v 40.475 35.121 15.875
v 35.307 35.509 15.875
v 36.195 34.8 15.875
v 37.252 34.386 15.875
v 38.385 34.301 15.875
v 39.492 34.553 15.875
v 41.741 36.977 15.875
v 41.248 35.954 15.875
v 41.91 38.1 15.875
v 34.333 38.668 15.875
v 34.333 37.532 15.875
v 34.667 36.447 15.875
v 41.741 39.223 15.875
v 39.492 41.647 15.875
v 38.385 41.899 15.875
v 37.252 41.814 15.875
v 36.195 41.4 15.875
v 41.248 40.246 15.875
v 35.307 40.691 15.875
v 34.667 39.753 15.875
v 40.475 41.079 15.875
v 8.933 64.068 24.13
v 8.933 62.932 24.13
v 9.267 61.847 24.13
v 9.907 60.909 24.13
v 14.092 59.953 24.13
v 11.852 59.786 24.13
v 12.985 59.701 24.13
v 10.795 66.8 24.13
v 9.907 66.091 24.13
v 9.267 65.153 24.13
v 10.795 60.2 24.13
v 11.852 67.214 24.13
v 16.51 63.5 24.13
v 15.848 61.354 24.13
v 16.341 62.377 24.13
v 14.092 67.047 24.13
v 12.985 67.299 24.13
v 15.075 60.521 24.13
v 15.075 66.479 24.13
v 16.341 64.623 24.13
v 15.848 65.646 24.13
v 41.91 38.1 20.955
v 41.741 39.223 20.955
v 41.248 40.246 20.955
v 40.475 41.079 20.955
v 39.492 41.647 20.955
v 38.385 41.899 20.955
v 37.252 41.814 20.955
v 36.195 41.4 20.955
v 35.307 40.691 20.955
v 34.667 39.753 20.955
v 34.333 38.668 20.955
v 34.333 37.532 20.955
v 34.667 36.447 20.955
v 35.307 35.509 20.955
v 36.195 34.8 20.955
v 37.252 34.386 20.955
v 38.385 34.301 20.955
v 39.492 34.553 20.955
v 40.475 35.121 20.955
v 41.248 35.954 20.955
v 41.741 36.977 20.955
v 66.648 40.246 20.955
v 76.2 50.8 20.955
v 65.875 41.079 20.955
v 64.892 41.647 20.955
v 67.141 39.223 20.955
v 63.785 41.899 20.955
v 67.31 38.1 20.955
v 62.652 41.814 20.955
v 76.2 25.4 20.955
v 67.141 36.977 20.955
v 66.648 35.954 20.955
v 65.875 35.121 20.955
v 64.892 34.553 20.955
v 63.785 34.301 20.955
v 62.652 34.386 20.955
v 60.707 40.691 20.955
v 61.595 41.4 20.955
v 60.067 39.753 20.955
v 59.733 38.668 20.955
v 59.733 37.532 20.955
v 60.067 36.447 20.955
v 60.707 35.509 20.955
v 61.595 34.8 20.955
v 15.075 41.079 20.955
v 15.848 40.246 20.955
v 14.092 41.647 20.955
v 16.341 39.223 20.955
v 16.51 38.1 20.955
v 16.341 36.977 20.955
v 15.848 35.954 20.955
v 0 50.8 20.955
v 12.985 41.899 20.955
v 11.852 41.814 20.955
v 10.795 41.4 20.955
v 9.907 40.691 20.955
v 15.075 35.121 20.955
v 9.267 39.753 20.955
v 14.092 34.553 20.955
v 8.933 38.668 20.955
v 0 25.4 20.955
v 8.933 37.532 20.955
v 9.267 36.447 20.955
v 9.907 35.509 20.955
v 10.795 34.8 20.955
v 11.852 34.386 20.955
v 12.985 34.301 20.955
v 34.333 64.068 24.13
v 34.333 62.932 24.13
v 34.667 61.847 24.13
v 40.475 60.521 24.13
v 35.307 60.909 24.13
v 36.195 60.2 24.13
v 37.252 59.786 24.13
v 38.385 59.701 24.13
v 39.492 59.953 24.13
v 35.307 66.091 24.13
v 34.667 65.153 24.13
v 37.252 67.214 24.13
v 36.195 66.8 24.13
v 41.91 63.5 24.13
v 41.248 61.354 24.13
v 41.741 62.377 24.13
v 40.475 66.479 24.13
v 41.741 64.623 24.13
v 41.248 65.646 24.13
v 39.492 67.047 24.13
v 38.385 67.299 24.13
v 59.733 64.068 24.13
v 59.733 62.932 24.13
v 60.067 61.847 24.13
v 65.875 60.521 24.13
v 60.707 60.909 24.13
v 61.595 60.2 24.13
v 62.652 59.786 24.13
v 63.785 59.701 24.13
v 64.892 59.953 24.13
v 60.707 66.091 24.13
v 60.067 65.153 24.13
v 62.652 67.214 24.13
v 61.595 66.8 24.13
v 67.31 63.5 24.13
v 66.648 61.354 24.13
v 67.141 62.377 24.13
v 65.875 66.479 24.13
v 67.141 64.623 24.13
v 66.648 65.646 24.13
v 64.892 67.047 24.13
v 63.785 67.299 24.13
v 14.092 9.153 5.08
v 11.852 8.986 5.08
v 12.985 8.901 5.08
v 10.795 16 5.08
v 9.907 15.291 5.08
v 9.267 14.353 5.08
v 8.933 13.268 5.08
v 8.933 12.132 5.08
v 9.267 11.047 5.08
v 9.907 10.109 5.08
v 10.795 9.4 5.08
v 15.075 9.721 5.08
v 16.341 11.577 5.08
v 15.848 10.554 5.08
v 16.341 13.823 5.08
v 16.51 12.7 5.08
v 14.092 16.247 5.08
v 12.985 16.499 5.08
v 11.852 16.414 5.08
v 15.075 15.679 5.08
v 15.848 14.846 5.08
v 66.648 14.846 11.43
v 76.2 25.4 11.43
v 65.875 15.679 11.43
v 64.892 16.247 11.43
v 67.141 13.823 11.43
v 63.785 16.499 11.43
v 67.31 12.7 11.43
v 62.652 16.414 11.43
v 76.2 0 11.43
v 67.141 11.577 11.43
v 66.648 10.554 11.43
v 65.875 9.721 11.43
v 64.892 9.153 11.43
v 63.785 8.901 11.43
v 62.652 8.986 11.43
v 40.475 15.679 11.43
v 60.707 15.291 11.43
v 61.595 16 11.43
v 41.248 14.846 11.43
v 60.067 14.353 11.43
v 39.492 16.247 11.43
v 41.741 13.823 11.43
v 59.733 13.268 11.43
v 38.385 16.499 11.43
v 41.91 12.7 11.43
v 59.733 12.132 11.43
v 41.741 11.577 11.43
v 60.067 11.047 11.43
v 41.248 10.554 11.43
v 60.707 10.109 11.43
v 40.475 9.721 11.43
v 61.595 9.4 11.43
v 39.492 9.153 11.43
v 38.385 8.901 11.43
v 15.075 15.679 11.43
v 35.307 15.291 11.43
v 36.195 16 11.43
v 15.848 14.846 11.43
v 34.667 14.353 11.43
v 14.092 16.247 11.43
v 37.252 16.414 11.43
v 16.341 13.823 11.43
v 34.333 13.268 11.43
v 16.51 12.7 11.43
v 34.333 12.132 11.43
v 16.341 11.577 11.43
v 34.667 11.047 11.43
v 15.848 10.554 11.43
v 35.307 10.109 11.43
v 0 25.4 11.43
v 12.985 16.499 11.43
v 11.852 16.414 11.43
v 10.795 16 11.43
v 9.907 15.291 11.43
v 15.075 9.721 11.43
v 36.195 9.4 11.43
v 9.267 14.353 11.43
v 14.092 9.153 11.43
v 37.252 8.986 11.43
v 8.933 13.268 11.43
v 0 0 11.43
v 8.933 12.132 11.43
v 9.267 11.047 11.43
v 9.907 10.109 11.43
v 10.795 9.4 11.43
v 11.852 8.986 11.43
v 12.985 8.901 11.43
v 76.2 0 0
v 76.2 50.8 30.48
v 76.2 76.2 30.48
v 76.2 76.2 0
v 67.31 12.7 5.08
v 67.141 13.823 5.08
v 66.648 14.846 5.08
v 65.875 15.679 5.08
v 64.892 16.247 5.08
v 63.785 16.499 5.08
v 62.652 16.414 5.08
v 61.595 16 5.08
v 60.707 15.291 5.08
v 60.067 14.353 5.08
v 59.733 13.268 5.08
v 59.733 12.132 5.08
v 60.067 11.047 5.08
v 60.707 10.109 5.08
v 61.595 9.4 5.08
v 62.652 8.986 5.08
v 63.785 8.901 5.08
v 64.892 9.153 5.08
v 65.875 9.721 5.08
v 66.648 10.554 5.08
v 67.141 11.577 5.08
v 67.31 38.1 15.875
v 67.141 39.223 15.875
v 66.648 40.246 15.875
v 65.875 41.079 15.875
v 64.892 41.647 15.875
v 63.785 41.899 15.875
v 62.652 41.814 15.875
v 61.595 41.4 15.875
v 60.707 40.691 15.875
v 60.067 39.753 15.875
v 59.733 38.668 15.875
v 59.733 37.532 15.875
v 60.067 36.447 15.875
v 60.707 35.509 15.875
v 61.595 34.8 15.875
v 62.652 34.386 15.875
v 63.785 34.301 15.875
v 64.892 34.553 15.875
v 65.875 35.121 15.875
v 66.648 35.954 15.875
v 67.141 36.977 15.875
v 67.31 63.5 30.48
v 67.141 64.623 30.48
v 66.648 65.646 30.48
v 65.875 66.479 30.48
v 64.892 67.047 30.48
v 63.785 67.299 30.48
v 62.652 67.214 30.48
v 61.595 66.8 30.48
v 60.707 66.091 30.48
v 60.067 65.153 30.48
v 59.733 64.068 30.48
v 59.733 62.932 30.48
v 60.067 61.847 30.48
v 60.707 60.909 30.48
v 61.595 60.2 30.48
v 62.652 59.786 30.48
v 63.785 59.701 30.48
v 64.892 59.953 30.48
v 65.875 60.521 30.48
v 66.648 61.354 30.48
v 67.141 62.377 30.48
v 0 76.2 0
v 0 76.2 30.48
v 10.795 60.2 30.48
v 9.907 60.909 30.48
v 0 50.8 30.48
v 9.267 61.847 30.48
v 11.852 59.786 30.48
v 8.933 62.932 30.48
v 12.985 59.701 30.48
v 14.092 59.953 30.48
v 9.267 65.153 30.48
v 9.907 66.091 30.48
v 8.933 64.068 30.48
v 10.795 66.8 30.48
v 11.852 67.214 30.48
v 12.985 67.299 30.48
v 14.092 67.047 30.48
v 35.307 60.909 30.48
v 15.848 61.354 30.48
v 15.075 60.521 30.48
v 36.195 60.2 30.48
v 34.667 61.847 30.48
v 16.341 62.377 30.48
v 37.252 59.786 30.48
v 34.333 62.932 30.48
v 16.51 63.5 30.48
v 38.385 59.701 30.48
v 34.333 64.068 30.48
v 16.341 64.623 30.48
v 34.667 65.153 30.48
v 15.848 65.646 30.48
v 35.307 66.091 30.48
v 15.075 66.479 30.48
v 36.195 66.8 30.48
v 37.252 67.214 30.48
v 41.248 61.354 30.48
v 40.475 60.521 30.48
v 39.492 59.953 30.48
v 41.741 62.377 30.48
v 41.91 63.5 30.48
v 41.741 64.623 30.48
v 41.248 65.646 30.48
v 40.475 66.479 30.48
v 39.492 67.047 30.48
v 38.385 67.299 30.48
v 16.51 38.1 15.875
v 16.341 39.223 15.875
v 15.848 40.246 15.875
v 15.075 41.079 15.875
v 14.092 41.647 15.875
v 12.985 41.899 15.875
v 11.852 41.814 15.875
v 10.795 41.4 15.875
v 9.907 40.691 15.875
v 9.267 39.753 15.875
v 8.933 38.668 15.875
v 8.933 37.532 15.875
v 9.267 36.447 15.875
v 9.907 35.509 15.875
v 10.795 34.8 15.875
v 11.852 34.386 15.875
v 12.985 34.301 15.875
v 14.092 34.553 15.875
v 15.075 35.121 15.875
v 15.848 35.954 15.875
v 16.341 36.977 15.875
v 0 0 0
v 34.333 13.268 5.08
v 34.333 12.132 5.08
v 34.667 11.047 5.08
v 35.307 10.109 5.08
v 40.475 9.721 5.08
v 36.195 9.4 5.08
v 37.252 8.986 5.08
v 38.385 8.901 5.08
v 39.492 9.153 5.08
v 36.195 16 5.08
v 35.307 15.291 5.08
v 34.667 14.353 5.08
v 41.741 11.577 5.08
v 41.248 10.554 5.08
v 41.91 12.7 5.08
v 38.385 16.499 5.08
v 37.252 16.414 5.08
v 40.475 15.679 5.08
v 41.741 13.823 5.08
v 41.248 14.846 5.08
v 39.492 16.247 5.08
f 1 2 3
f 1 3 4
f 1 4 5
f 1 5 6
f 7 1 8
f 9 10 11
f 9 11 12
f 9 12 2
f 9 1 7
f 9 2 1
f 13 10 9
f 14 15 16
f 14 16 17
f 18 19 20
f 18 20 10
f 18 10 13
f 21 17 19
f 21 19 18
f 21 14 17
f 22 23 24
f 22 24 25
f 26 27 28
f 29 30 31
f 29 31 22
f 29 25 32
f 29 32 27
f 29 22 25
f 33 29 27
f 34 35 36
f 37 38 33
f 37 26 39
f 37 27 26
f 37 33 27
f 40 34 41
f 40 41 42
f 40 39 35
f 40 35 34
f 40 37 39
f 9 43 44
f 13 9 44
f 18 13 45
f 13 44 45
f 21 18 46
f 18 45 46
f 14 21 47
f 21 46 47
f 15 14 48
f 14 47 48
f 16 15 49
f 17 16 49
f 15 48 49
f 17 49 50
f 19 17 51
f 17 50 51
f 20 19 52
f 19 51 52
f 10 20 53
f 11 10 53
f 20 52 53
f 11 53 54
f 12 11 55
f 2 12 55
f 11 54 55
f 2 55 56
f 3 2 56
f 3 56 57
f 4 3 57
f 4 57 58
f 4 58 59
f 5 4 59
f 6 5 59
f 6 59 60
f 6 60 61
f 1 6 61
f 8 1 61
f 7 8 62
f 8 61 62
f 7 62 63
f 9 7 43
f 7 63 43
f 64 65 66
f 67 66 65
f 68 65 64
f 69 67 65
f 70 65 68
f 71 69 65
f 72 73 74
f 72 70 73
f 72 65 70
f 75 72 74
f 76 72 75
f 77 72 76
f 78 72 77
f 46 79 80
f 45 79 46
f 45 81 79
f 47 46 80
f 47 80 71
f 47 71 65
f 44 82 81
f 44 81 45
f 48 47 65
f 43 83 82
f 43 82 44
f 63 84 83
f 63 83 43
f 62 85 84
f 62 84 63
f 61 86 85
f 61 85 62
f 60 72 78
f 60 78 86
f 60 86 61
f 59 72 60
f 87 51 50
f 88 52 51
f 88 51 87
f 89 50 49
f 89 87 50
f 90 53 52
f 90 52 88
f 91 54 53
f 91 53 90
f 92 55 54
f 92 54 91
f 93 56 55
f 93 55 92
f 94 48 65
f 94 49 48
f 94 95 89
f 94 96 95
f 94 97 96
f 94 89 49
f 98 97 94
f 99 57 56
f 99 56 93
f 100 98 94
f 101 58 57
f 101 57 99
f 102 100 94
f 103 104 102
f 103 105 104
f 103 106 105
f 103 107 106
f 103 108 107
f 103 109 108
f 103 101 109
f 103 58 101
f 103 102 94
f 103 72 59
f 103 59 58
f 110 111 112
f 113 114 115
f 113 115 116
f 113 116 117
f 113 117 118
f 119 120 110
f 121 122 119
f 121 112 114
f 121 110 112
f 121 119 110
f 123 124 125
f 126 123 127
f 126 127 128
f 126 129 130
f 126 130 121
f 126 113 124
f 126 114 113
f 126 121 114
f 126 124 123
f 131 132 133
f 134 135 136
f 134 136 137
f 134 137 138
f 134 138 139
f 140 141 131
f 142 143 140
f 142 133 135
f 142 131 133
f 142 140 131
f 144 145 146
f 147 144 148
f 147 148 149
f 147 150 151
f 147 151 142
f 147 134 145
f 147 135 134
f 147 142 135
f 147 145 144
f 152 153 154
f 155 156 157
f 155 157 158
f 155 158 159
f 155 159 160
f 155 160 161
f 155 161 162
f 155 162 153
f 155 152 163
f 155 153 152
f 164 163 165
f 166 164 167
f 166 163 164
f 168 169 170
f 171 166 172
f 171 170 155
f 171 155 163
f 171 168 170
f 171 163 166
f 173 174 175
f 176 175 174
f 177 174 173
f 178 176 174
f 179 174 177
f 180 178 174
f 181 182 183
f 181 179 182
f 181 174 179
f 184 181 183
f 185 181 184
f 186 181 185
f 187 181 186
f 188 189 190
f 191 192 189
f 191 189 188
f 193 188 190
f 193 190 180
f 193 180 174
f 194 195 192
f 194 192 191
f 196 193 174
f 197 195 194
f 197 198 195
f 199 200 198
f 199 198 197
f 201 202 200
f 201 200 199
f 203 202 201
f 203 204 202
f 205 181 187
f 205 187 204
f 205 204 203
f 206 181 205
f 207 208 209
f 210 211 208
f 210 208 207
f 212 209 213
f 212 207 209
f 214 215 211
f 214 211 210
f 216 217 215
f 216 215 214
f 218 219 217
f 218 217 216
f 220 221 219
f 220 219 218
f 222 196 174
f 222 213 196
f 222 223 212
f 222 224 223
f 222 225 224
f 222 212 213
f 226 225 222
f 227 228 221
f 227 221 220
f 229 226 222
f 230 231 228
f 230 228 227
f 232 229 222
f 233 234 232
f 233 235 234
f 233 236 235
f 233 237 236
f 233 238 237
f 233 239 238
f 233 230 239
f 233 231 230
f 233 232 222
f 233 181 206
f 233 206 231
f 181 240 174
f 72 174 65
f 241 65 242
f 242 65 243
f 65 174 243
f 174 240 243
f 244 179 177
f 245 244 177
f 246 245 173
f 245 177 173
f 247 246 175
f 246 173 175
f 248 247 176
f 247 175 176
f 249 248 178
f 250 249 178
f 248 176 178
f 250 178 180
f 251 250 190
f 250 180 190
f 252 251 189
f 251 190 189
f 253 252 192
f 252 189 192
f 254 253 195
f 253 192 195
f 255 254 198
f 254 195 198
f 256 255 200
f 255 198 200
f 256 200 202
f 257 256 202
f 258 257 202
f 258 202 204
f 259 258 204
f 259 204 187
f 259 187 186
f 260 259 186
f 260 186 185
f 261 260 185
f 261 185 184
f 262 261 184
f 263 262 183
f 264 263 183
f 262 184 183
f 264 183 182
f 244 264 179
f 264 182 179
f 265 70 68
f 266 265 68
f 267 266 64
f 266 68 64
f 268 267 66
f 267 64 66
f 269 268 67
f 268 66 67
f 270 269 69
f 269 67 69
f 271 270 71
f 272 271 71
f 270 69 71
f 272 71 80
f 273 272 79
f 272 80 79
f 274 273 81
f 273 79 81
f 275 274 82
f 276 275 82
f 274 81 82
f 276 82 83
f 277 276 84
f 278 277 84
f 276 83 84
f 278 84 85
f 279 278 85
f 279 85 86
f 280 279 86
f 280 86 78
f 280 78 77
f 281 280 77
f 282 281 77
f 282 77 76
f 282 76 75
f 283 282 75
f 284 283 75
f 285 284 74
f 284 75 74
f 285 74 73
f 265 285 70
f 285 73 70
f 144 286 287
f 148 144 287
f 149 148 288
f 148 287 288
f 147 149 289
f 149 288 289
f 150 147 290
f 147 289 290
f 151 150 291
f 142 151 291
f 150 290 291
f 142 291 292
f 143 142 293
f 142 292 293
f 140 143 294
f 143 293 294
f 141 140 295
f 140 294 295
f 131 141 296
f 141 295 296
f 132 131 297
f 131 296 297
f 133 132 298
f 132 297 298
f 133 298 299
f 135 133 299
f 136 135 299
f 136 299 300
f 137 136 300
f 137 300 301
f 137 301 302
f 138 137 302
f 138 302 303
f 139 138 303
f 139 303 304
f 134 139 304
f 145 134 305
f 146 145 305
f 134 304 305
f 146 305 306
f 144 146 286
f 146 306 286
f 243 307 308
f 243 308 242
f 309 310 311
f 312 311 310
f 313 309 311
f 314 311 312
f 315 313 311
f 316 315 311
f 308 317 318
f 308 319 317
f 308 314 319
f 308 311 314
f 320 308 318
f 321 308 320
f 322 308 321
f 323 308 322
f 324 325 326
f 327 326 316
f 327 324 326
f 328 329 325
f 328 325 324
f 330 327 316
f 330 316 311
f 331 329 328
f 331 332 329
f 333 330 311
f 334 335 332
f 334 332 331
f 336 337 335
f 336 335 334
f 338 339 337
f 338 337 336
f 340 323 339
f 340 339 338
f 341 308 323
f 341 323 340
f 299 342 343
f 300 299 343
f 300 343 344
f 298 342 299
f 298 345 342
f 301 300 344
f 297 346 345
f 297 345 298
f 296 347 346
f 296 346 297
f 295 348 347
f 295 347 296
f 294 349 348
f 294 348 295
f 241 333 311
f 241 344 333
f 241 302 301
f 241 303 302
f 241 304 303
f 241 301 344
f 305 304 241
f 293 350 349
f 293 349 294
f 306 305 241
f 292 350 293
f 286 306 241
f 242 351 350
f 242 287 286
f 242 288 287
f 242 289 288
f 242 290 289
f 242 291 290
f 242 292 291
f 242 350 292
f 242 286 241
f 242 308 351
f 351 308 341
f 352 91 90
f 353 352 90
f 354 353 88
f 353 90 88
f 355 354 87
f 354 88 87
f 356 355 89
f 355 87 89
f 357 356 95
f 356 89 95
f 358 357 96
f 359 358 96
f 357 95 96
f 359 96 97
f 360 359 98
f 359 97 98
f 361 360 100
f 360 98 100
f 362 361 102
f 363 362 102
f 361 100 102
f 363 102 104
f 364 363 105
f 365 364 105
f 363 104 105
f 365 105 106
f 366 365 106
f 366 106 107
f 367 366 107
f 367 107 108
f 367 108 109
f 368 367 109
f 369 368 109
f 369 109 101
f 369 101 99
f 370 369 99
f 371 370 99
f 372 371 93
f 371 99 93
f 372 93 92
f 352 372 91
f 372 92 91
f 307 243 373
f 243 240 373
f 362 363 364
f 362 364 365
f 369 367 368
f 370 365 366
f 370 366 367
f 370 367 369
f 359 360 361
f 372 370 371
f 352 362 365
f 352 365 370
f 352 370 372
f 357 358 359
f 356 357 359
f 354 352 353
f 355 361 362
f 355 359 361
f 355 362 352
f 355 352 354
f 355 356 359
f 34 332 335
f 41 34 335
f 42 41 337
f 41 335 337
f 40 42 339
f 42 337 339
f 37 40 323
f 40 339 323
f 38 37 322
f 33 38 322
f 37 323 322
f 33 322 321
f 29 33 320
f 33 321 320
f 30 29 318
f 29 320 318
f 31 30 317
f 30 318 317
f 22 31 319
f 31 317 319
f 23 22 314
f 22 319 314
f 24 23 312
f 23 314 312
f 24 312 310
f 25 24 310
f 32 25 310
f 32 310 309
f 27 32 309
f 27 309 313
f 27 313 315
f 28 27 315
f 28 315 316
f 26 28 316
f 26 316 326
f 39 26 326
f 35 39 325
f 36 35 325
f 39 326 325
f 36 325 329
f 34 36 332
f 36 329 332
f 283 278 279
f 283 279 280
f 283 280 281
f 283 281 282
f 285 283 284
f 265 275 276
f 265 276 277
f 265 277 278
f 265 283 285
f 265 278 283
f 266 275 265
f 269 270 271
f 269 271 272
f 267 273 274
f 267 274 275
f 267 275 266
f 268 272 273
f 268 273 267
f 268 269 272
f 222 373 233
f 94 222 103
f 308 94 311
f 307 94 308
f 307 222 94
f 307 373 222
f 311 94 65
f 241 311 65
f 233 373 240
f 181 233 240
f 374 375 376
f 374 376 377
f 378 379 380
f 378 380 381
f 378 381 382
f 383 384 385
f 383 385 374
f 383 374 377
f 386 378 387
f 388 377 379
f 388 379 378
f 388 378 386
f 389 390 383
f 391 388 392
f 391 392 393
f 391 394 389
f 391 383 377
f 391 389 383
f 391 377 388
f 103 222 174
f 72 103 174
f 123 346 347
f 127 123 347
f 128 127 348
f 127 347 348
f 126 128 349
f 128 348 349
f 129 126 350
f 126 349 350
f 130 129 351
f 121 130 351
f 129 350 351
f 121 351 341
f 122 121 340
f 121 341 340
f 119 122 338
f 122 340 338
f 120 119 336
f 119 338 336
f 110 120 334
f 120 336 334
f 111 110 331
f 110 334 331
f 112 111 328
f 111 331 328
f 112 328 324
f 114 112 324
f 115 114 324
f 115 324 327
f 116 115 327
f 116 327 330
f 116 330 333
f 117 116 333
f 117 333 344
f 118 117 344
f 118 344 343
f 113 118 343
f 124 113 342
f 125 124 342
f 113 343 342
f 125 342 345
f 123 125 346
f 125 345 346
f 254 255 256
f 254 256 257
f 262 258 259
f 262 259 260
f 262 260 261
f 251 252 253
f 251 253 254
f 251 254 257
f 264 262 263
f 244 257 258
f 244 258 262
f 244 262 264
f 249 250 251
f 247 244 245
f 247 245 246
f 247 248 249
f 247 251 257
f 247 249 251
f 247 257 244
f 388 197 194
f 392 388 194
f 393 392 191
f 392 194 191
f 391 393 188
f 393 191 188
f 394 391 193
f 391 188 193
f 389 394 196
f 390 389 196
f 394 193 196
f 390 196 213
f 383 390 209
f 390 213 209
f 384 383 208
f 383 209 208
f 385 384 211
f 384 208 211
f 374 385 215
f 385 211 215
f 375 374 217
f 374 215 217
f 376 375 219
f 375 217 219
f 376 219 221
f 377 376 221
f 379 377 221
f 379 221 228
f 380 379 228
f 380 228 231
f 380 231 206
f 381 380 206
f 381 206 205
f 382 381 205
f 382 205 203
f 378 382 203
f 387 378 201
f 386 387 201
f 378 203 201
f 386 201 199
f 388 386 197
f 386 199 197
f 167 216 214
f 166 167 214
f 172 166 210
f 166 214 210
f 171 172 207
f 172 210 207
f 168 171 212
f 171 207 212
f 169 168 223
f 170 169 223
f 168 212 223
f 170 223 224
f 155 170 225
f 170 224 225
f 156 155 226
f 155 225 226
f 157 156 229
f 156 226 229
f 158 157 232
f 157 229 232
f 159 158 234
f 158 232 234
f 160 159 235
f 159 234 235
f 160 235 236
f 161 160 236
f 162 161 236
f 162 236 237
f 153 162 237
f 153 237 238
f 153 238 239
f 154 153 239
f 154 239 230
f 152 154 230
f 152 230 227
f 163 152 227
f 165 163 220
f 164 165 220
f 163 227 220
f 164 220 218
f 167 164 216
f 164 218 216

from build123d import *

# Parameters (mm, degrees)
F0_W      = 76.2
F0_H      = 25.4
F1_DEPTH  = 11.43
F2_R      = 3.81
F3_DEPTH  = 6.35
F4_W      = 76.2
F4_H      = 11.43
F5_DEPTH  = 25.4
F6_W      = 76.2
F6_H      = 25.4
F7_DEPTH  = 9.525
F8_W      = 76.2
F8_H      = 20.955
F9_DEPTH  = 25.4
F10_W     = 76.2
F10_H     = 25.4
F11_DEPTH = 9.525
F12_R     = 3.81
F13_DEPTH = 5.08
F14_R     = 3.81
F15_DEPTH = 6.35


with BuildPart() as f1:
    # F0 (on Top) → F1 (new body)
    with BuildSketch(Plane.XY):
        with Locations((38.1, 12.7)):
            Rectangle(F0_W, F0_H)
    extrude(amount=F1_DEPTH)

    # F2 (on face) → F3 (cut)
    with BuildSketch(Plane.XY.offset(11.43)):
        with Locations((12.7, 12.7)):
            Circle(F2_R)
        with Locations((38.1, 12.7)):
            Circle(F2_R)
        with Locations((63.5, 12.7)):
            Circle(F2_R)
    extrude(amount=-F3_DEPTH, mode=Mode.SUBTRACT)

    # F4 (on face) → F5 (join)
    with BuildSketch(Plane(origin=(0, 25.4, 0), x_dir=(-1, 0, 0), z_dir=(0, 1, 0))):
        with Locations((-38.1, 5.715)):
            Rectangle(F4_W, F4_H)
    extrude(amount=F5_DEPTH)

    # F6 (on face) → F7 (join)
    with BuildSketch(Plane.XY.offset(11.43)):
        with Locations((38.1, 38.1)):
            Rectangle(F6_W, F6_H)
    extrude(amount=F7_DEPTH)

    # F8 (on face) → F9 (join)
    with BuildSketch(Plane(origin=(0, 50.8, 0), x_dir=(-1, 0, 0), z_dir=(0, 1, 0))):
        with Locations((-38.1, 10.4775)):
            Rectangle(F8_W, F8_H)
    extrude(amount=F9_DEPTH)

    # F10 (on face) → F11 (join)
    with BuildSketch(Plane.XY.offset(20.955)):
        with Locations((38.1, 63.5)):
            Rectangle(F10_W, F10_H)
    extrude(amount=F11_DEPTH)

    # F12 (on face) → F13 (cut)
    with BuildSketch(Plane.XY.offset(20.955)):
        with Locations((12.7, 38.1)):
            Circle(F12_R)
        with Locations((38.1, 38.1)):
            Circle(F12_R)
        with Locations((63.5, 38.1)):
            Circle(F12_R)
    extrude(amount=-F13_DEPTH, mode=Mode.SUBTRACT)

    # F14 (on face) → F15 (cut)
    with BuildSketch(Plane.XY.offset(30.48)):
        with Locations((12.7, 63.5)):
            Circle(F14_R)
        with Locations((38.1, 63.5)):
            Circle(F14_R)
        with Locations((63.5, 63.5)):
            Circle(F14_R)
    extrude(amount=-F15_DEPTH, mode=Mode.SUBTRACT)


solid = f1.part
